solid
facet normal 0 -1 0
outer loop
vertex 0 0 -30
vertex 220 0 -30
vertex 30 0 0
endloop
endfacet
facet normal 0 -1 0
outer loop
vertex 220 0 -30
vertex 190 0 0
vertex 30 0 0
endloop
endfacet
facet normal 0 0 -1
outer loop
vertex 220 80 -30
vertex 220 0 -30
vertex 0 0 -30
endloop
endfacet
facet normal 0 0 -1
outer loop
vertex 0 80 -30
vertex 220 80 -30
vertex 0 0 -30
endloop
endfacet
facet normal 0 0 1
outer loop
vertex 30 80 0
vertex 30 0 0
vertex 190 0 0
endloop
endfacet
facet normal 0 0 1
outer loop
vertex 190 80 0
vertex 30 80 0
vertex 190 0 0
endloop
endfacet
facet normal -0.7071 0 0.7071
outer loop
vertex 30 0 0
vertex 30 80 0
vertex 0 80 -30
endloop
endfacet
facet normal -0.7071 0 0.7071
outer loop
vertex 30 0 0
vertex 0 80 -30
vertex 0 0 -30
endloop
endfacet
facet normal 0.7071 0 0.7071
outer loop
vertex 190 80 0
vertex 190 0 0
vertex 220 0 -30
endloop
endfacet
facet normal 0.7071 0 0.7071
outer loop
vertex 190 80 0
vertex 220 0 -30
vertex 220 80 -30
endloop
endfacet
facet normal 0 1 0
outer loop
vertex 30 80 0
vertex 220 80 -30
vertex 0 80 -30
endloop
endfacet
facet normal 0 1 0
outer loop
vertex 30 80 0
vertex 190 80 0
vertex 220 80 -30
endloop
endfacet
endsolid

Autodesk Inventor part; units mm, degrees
ref_plane "YZ Plane" through (0, 0, 0) normal (1, 0, 0) x (0, 1, 0)
ref_plane "XZ Plane" through (0, 0, 0) normal (0, 1, 0) x (-1, 0, 0)
ref_plane "XY Plane" through (0, 0, 0) normal (0, 0, 1) x (1, 0, 0)
sketch "Эскиз1" plane through (0, 0, 0) normal (0, 1, 0) x (-1, 0, 0)
  line L0 (0, 0) -> (-220, 0)
  line L1 (-220, 0) -> (-220, -30)
  line L2 (-220, -30) -> (0, -30)
  line L3 (0, -30) -> (0, 0)
  dimension "d0" = 220
  dimension "d1" = 30
extrude "Выдавливание1" add sketch "Эскиз1" along normal blind 80
chamfer "Фаска1" distance 30 angle 45 2 edges at (0, 40, 0) (220, 40, 0)
properties part number "dou_long" material "Красное дерево"
